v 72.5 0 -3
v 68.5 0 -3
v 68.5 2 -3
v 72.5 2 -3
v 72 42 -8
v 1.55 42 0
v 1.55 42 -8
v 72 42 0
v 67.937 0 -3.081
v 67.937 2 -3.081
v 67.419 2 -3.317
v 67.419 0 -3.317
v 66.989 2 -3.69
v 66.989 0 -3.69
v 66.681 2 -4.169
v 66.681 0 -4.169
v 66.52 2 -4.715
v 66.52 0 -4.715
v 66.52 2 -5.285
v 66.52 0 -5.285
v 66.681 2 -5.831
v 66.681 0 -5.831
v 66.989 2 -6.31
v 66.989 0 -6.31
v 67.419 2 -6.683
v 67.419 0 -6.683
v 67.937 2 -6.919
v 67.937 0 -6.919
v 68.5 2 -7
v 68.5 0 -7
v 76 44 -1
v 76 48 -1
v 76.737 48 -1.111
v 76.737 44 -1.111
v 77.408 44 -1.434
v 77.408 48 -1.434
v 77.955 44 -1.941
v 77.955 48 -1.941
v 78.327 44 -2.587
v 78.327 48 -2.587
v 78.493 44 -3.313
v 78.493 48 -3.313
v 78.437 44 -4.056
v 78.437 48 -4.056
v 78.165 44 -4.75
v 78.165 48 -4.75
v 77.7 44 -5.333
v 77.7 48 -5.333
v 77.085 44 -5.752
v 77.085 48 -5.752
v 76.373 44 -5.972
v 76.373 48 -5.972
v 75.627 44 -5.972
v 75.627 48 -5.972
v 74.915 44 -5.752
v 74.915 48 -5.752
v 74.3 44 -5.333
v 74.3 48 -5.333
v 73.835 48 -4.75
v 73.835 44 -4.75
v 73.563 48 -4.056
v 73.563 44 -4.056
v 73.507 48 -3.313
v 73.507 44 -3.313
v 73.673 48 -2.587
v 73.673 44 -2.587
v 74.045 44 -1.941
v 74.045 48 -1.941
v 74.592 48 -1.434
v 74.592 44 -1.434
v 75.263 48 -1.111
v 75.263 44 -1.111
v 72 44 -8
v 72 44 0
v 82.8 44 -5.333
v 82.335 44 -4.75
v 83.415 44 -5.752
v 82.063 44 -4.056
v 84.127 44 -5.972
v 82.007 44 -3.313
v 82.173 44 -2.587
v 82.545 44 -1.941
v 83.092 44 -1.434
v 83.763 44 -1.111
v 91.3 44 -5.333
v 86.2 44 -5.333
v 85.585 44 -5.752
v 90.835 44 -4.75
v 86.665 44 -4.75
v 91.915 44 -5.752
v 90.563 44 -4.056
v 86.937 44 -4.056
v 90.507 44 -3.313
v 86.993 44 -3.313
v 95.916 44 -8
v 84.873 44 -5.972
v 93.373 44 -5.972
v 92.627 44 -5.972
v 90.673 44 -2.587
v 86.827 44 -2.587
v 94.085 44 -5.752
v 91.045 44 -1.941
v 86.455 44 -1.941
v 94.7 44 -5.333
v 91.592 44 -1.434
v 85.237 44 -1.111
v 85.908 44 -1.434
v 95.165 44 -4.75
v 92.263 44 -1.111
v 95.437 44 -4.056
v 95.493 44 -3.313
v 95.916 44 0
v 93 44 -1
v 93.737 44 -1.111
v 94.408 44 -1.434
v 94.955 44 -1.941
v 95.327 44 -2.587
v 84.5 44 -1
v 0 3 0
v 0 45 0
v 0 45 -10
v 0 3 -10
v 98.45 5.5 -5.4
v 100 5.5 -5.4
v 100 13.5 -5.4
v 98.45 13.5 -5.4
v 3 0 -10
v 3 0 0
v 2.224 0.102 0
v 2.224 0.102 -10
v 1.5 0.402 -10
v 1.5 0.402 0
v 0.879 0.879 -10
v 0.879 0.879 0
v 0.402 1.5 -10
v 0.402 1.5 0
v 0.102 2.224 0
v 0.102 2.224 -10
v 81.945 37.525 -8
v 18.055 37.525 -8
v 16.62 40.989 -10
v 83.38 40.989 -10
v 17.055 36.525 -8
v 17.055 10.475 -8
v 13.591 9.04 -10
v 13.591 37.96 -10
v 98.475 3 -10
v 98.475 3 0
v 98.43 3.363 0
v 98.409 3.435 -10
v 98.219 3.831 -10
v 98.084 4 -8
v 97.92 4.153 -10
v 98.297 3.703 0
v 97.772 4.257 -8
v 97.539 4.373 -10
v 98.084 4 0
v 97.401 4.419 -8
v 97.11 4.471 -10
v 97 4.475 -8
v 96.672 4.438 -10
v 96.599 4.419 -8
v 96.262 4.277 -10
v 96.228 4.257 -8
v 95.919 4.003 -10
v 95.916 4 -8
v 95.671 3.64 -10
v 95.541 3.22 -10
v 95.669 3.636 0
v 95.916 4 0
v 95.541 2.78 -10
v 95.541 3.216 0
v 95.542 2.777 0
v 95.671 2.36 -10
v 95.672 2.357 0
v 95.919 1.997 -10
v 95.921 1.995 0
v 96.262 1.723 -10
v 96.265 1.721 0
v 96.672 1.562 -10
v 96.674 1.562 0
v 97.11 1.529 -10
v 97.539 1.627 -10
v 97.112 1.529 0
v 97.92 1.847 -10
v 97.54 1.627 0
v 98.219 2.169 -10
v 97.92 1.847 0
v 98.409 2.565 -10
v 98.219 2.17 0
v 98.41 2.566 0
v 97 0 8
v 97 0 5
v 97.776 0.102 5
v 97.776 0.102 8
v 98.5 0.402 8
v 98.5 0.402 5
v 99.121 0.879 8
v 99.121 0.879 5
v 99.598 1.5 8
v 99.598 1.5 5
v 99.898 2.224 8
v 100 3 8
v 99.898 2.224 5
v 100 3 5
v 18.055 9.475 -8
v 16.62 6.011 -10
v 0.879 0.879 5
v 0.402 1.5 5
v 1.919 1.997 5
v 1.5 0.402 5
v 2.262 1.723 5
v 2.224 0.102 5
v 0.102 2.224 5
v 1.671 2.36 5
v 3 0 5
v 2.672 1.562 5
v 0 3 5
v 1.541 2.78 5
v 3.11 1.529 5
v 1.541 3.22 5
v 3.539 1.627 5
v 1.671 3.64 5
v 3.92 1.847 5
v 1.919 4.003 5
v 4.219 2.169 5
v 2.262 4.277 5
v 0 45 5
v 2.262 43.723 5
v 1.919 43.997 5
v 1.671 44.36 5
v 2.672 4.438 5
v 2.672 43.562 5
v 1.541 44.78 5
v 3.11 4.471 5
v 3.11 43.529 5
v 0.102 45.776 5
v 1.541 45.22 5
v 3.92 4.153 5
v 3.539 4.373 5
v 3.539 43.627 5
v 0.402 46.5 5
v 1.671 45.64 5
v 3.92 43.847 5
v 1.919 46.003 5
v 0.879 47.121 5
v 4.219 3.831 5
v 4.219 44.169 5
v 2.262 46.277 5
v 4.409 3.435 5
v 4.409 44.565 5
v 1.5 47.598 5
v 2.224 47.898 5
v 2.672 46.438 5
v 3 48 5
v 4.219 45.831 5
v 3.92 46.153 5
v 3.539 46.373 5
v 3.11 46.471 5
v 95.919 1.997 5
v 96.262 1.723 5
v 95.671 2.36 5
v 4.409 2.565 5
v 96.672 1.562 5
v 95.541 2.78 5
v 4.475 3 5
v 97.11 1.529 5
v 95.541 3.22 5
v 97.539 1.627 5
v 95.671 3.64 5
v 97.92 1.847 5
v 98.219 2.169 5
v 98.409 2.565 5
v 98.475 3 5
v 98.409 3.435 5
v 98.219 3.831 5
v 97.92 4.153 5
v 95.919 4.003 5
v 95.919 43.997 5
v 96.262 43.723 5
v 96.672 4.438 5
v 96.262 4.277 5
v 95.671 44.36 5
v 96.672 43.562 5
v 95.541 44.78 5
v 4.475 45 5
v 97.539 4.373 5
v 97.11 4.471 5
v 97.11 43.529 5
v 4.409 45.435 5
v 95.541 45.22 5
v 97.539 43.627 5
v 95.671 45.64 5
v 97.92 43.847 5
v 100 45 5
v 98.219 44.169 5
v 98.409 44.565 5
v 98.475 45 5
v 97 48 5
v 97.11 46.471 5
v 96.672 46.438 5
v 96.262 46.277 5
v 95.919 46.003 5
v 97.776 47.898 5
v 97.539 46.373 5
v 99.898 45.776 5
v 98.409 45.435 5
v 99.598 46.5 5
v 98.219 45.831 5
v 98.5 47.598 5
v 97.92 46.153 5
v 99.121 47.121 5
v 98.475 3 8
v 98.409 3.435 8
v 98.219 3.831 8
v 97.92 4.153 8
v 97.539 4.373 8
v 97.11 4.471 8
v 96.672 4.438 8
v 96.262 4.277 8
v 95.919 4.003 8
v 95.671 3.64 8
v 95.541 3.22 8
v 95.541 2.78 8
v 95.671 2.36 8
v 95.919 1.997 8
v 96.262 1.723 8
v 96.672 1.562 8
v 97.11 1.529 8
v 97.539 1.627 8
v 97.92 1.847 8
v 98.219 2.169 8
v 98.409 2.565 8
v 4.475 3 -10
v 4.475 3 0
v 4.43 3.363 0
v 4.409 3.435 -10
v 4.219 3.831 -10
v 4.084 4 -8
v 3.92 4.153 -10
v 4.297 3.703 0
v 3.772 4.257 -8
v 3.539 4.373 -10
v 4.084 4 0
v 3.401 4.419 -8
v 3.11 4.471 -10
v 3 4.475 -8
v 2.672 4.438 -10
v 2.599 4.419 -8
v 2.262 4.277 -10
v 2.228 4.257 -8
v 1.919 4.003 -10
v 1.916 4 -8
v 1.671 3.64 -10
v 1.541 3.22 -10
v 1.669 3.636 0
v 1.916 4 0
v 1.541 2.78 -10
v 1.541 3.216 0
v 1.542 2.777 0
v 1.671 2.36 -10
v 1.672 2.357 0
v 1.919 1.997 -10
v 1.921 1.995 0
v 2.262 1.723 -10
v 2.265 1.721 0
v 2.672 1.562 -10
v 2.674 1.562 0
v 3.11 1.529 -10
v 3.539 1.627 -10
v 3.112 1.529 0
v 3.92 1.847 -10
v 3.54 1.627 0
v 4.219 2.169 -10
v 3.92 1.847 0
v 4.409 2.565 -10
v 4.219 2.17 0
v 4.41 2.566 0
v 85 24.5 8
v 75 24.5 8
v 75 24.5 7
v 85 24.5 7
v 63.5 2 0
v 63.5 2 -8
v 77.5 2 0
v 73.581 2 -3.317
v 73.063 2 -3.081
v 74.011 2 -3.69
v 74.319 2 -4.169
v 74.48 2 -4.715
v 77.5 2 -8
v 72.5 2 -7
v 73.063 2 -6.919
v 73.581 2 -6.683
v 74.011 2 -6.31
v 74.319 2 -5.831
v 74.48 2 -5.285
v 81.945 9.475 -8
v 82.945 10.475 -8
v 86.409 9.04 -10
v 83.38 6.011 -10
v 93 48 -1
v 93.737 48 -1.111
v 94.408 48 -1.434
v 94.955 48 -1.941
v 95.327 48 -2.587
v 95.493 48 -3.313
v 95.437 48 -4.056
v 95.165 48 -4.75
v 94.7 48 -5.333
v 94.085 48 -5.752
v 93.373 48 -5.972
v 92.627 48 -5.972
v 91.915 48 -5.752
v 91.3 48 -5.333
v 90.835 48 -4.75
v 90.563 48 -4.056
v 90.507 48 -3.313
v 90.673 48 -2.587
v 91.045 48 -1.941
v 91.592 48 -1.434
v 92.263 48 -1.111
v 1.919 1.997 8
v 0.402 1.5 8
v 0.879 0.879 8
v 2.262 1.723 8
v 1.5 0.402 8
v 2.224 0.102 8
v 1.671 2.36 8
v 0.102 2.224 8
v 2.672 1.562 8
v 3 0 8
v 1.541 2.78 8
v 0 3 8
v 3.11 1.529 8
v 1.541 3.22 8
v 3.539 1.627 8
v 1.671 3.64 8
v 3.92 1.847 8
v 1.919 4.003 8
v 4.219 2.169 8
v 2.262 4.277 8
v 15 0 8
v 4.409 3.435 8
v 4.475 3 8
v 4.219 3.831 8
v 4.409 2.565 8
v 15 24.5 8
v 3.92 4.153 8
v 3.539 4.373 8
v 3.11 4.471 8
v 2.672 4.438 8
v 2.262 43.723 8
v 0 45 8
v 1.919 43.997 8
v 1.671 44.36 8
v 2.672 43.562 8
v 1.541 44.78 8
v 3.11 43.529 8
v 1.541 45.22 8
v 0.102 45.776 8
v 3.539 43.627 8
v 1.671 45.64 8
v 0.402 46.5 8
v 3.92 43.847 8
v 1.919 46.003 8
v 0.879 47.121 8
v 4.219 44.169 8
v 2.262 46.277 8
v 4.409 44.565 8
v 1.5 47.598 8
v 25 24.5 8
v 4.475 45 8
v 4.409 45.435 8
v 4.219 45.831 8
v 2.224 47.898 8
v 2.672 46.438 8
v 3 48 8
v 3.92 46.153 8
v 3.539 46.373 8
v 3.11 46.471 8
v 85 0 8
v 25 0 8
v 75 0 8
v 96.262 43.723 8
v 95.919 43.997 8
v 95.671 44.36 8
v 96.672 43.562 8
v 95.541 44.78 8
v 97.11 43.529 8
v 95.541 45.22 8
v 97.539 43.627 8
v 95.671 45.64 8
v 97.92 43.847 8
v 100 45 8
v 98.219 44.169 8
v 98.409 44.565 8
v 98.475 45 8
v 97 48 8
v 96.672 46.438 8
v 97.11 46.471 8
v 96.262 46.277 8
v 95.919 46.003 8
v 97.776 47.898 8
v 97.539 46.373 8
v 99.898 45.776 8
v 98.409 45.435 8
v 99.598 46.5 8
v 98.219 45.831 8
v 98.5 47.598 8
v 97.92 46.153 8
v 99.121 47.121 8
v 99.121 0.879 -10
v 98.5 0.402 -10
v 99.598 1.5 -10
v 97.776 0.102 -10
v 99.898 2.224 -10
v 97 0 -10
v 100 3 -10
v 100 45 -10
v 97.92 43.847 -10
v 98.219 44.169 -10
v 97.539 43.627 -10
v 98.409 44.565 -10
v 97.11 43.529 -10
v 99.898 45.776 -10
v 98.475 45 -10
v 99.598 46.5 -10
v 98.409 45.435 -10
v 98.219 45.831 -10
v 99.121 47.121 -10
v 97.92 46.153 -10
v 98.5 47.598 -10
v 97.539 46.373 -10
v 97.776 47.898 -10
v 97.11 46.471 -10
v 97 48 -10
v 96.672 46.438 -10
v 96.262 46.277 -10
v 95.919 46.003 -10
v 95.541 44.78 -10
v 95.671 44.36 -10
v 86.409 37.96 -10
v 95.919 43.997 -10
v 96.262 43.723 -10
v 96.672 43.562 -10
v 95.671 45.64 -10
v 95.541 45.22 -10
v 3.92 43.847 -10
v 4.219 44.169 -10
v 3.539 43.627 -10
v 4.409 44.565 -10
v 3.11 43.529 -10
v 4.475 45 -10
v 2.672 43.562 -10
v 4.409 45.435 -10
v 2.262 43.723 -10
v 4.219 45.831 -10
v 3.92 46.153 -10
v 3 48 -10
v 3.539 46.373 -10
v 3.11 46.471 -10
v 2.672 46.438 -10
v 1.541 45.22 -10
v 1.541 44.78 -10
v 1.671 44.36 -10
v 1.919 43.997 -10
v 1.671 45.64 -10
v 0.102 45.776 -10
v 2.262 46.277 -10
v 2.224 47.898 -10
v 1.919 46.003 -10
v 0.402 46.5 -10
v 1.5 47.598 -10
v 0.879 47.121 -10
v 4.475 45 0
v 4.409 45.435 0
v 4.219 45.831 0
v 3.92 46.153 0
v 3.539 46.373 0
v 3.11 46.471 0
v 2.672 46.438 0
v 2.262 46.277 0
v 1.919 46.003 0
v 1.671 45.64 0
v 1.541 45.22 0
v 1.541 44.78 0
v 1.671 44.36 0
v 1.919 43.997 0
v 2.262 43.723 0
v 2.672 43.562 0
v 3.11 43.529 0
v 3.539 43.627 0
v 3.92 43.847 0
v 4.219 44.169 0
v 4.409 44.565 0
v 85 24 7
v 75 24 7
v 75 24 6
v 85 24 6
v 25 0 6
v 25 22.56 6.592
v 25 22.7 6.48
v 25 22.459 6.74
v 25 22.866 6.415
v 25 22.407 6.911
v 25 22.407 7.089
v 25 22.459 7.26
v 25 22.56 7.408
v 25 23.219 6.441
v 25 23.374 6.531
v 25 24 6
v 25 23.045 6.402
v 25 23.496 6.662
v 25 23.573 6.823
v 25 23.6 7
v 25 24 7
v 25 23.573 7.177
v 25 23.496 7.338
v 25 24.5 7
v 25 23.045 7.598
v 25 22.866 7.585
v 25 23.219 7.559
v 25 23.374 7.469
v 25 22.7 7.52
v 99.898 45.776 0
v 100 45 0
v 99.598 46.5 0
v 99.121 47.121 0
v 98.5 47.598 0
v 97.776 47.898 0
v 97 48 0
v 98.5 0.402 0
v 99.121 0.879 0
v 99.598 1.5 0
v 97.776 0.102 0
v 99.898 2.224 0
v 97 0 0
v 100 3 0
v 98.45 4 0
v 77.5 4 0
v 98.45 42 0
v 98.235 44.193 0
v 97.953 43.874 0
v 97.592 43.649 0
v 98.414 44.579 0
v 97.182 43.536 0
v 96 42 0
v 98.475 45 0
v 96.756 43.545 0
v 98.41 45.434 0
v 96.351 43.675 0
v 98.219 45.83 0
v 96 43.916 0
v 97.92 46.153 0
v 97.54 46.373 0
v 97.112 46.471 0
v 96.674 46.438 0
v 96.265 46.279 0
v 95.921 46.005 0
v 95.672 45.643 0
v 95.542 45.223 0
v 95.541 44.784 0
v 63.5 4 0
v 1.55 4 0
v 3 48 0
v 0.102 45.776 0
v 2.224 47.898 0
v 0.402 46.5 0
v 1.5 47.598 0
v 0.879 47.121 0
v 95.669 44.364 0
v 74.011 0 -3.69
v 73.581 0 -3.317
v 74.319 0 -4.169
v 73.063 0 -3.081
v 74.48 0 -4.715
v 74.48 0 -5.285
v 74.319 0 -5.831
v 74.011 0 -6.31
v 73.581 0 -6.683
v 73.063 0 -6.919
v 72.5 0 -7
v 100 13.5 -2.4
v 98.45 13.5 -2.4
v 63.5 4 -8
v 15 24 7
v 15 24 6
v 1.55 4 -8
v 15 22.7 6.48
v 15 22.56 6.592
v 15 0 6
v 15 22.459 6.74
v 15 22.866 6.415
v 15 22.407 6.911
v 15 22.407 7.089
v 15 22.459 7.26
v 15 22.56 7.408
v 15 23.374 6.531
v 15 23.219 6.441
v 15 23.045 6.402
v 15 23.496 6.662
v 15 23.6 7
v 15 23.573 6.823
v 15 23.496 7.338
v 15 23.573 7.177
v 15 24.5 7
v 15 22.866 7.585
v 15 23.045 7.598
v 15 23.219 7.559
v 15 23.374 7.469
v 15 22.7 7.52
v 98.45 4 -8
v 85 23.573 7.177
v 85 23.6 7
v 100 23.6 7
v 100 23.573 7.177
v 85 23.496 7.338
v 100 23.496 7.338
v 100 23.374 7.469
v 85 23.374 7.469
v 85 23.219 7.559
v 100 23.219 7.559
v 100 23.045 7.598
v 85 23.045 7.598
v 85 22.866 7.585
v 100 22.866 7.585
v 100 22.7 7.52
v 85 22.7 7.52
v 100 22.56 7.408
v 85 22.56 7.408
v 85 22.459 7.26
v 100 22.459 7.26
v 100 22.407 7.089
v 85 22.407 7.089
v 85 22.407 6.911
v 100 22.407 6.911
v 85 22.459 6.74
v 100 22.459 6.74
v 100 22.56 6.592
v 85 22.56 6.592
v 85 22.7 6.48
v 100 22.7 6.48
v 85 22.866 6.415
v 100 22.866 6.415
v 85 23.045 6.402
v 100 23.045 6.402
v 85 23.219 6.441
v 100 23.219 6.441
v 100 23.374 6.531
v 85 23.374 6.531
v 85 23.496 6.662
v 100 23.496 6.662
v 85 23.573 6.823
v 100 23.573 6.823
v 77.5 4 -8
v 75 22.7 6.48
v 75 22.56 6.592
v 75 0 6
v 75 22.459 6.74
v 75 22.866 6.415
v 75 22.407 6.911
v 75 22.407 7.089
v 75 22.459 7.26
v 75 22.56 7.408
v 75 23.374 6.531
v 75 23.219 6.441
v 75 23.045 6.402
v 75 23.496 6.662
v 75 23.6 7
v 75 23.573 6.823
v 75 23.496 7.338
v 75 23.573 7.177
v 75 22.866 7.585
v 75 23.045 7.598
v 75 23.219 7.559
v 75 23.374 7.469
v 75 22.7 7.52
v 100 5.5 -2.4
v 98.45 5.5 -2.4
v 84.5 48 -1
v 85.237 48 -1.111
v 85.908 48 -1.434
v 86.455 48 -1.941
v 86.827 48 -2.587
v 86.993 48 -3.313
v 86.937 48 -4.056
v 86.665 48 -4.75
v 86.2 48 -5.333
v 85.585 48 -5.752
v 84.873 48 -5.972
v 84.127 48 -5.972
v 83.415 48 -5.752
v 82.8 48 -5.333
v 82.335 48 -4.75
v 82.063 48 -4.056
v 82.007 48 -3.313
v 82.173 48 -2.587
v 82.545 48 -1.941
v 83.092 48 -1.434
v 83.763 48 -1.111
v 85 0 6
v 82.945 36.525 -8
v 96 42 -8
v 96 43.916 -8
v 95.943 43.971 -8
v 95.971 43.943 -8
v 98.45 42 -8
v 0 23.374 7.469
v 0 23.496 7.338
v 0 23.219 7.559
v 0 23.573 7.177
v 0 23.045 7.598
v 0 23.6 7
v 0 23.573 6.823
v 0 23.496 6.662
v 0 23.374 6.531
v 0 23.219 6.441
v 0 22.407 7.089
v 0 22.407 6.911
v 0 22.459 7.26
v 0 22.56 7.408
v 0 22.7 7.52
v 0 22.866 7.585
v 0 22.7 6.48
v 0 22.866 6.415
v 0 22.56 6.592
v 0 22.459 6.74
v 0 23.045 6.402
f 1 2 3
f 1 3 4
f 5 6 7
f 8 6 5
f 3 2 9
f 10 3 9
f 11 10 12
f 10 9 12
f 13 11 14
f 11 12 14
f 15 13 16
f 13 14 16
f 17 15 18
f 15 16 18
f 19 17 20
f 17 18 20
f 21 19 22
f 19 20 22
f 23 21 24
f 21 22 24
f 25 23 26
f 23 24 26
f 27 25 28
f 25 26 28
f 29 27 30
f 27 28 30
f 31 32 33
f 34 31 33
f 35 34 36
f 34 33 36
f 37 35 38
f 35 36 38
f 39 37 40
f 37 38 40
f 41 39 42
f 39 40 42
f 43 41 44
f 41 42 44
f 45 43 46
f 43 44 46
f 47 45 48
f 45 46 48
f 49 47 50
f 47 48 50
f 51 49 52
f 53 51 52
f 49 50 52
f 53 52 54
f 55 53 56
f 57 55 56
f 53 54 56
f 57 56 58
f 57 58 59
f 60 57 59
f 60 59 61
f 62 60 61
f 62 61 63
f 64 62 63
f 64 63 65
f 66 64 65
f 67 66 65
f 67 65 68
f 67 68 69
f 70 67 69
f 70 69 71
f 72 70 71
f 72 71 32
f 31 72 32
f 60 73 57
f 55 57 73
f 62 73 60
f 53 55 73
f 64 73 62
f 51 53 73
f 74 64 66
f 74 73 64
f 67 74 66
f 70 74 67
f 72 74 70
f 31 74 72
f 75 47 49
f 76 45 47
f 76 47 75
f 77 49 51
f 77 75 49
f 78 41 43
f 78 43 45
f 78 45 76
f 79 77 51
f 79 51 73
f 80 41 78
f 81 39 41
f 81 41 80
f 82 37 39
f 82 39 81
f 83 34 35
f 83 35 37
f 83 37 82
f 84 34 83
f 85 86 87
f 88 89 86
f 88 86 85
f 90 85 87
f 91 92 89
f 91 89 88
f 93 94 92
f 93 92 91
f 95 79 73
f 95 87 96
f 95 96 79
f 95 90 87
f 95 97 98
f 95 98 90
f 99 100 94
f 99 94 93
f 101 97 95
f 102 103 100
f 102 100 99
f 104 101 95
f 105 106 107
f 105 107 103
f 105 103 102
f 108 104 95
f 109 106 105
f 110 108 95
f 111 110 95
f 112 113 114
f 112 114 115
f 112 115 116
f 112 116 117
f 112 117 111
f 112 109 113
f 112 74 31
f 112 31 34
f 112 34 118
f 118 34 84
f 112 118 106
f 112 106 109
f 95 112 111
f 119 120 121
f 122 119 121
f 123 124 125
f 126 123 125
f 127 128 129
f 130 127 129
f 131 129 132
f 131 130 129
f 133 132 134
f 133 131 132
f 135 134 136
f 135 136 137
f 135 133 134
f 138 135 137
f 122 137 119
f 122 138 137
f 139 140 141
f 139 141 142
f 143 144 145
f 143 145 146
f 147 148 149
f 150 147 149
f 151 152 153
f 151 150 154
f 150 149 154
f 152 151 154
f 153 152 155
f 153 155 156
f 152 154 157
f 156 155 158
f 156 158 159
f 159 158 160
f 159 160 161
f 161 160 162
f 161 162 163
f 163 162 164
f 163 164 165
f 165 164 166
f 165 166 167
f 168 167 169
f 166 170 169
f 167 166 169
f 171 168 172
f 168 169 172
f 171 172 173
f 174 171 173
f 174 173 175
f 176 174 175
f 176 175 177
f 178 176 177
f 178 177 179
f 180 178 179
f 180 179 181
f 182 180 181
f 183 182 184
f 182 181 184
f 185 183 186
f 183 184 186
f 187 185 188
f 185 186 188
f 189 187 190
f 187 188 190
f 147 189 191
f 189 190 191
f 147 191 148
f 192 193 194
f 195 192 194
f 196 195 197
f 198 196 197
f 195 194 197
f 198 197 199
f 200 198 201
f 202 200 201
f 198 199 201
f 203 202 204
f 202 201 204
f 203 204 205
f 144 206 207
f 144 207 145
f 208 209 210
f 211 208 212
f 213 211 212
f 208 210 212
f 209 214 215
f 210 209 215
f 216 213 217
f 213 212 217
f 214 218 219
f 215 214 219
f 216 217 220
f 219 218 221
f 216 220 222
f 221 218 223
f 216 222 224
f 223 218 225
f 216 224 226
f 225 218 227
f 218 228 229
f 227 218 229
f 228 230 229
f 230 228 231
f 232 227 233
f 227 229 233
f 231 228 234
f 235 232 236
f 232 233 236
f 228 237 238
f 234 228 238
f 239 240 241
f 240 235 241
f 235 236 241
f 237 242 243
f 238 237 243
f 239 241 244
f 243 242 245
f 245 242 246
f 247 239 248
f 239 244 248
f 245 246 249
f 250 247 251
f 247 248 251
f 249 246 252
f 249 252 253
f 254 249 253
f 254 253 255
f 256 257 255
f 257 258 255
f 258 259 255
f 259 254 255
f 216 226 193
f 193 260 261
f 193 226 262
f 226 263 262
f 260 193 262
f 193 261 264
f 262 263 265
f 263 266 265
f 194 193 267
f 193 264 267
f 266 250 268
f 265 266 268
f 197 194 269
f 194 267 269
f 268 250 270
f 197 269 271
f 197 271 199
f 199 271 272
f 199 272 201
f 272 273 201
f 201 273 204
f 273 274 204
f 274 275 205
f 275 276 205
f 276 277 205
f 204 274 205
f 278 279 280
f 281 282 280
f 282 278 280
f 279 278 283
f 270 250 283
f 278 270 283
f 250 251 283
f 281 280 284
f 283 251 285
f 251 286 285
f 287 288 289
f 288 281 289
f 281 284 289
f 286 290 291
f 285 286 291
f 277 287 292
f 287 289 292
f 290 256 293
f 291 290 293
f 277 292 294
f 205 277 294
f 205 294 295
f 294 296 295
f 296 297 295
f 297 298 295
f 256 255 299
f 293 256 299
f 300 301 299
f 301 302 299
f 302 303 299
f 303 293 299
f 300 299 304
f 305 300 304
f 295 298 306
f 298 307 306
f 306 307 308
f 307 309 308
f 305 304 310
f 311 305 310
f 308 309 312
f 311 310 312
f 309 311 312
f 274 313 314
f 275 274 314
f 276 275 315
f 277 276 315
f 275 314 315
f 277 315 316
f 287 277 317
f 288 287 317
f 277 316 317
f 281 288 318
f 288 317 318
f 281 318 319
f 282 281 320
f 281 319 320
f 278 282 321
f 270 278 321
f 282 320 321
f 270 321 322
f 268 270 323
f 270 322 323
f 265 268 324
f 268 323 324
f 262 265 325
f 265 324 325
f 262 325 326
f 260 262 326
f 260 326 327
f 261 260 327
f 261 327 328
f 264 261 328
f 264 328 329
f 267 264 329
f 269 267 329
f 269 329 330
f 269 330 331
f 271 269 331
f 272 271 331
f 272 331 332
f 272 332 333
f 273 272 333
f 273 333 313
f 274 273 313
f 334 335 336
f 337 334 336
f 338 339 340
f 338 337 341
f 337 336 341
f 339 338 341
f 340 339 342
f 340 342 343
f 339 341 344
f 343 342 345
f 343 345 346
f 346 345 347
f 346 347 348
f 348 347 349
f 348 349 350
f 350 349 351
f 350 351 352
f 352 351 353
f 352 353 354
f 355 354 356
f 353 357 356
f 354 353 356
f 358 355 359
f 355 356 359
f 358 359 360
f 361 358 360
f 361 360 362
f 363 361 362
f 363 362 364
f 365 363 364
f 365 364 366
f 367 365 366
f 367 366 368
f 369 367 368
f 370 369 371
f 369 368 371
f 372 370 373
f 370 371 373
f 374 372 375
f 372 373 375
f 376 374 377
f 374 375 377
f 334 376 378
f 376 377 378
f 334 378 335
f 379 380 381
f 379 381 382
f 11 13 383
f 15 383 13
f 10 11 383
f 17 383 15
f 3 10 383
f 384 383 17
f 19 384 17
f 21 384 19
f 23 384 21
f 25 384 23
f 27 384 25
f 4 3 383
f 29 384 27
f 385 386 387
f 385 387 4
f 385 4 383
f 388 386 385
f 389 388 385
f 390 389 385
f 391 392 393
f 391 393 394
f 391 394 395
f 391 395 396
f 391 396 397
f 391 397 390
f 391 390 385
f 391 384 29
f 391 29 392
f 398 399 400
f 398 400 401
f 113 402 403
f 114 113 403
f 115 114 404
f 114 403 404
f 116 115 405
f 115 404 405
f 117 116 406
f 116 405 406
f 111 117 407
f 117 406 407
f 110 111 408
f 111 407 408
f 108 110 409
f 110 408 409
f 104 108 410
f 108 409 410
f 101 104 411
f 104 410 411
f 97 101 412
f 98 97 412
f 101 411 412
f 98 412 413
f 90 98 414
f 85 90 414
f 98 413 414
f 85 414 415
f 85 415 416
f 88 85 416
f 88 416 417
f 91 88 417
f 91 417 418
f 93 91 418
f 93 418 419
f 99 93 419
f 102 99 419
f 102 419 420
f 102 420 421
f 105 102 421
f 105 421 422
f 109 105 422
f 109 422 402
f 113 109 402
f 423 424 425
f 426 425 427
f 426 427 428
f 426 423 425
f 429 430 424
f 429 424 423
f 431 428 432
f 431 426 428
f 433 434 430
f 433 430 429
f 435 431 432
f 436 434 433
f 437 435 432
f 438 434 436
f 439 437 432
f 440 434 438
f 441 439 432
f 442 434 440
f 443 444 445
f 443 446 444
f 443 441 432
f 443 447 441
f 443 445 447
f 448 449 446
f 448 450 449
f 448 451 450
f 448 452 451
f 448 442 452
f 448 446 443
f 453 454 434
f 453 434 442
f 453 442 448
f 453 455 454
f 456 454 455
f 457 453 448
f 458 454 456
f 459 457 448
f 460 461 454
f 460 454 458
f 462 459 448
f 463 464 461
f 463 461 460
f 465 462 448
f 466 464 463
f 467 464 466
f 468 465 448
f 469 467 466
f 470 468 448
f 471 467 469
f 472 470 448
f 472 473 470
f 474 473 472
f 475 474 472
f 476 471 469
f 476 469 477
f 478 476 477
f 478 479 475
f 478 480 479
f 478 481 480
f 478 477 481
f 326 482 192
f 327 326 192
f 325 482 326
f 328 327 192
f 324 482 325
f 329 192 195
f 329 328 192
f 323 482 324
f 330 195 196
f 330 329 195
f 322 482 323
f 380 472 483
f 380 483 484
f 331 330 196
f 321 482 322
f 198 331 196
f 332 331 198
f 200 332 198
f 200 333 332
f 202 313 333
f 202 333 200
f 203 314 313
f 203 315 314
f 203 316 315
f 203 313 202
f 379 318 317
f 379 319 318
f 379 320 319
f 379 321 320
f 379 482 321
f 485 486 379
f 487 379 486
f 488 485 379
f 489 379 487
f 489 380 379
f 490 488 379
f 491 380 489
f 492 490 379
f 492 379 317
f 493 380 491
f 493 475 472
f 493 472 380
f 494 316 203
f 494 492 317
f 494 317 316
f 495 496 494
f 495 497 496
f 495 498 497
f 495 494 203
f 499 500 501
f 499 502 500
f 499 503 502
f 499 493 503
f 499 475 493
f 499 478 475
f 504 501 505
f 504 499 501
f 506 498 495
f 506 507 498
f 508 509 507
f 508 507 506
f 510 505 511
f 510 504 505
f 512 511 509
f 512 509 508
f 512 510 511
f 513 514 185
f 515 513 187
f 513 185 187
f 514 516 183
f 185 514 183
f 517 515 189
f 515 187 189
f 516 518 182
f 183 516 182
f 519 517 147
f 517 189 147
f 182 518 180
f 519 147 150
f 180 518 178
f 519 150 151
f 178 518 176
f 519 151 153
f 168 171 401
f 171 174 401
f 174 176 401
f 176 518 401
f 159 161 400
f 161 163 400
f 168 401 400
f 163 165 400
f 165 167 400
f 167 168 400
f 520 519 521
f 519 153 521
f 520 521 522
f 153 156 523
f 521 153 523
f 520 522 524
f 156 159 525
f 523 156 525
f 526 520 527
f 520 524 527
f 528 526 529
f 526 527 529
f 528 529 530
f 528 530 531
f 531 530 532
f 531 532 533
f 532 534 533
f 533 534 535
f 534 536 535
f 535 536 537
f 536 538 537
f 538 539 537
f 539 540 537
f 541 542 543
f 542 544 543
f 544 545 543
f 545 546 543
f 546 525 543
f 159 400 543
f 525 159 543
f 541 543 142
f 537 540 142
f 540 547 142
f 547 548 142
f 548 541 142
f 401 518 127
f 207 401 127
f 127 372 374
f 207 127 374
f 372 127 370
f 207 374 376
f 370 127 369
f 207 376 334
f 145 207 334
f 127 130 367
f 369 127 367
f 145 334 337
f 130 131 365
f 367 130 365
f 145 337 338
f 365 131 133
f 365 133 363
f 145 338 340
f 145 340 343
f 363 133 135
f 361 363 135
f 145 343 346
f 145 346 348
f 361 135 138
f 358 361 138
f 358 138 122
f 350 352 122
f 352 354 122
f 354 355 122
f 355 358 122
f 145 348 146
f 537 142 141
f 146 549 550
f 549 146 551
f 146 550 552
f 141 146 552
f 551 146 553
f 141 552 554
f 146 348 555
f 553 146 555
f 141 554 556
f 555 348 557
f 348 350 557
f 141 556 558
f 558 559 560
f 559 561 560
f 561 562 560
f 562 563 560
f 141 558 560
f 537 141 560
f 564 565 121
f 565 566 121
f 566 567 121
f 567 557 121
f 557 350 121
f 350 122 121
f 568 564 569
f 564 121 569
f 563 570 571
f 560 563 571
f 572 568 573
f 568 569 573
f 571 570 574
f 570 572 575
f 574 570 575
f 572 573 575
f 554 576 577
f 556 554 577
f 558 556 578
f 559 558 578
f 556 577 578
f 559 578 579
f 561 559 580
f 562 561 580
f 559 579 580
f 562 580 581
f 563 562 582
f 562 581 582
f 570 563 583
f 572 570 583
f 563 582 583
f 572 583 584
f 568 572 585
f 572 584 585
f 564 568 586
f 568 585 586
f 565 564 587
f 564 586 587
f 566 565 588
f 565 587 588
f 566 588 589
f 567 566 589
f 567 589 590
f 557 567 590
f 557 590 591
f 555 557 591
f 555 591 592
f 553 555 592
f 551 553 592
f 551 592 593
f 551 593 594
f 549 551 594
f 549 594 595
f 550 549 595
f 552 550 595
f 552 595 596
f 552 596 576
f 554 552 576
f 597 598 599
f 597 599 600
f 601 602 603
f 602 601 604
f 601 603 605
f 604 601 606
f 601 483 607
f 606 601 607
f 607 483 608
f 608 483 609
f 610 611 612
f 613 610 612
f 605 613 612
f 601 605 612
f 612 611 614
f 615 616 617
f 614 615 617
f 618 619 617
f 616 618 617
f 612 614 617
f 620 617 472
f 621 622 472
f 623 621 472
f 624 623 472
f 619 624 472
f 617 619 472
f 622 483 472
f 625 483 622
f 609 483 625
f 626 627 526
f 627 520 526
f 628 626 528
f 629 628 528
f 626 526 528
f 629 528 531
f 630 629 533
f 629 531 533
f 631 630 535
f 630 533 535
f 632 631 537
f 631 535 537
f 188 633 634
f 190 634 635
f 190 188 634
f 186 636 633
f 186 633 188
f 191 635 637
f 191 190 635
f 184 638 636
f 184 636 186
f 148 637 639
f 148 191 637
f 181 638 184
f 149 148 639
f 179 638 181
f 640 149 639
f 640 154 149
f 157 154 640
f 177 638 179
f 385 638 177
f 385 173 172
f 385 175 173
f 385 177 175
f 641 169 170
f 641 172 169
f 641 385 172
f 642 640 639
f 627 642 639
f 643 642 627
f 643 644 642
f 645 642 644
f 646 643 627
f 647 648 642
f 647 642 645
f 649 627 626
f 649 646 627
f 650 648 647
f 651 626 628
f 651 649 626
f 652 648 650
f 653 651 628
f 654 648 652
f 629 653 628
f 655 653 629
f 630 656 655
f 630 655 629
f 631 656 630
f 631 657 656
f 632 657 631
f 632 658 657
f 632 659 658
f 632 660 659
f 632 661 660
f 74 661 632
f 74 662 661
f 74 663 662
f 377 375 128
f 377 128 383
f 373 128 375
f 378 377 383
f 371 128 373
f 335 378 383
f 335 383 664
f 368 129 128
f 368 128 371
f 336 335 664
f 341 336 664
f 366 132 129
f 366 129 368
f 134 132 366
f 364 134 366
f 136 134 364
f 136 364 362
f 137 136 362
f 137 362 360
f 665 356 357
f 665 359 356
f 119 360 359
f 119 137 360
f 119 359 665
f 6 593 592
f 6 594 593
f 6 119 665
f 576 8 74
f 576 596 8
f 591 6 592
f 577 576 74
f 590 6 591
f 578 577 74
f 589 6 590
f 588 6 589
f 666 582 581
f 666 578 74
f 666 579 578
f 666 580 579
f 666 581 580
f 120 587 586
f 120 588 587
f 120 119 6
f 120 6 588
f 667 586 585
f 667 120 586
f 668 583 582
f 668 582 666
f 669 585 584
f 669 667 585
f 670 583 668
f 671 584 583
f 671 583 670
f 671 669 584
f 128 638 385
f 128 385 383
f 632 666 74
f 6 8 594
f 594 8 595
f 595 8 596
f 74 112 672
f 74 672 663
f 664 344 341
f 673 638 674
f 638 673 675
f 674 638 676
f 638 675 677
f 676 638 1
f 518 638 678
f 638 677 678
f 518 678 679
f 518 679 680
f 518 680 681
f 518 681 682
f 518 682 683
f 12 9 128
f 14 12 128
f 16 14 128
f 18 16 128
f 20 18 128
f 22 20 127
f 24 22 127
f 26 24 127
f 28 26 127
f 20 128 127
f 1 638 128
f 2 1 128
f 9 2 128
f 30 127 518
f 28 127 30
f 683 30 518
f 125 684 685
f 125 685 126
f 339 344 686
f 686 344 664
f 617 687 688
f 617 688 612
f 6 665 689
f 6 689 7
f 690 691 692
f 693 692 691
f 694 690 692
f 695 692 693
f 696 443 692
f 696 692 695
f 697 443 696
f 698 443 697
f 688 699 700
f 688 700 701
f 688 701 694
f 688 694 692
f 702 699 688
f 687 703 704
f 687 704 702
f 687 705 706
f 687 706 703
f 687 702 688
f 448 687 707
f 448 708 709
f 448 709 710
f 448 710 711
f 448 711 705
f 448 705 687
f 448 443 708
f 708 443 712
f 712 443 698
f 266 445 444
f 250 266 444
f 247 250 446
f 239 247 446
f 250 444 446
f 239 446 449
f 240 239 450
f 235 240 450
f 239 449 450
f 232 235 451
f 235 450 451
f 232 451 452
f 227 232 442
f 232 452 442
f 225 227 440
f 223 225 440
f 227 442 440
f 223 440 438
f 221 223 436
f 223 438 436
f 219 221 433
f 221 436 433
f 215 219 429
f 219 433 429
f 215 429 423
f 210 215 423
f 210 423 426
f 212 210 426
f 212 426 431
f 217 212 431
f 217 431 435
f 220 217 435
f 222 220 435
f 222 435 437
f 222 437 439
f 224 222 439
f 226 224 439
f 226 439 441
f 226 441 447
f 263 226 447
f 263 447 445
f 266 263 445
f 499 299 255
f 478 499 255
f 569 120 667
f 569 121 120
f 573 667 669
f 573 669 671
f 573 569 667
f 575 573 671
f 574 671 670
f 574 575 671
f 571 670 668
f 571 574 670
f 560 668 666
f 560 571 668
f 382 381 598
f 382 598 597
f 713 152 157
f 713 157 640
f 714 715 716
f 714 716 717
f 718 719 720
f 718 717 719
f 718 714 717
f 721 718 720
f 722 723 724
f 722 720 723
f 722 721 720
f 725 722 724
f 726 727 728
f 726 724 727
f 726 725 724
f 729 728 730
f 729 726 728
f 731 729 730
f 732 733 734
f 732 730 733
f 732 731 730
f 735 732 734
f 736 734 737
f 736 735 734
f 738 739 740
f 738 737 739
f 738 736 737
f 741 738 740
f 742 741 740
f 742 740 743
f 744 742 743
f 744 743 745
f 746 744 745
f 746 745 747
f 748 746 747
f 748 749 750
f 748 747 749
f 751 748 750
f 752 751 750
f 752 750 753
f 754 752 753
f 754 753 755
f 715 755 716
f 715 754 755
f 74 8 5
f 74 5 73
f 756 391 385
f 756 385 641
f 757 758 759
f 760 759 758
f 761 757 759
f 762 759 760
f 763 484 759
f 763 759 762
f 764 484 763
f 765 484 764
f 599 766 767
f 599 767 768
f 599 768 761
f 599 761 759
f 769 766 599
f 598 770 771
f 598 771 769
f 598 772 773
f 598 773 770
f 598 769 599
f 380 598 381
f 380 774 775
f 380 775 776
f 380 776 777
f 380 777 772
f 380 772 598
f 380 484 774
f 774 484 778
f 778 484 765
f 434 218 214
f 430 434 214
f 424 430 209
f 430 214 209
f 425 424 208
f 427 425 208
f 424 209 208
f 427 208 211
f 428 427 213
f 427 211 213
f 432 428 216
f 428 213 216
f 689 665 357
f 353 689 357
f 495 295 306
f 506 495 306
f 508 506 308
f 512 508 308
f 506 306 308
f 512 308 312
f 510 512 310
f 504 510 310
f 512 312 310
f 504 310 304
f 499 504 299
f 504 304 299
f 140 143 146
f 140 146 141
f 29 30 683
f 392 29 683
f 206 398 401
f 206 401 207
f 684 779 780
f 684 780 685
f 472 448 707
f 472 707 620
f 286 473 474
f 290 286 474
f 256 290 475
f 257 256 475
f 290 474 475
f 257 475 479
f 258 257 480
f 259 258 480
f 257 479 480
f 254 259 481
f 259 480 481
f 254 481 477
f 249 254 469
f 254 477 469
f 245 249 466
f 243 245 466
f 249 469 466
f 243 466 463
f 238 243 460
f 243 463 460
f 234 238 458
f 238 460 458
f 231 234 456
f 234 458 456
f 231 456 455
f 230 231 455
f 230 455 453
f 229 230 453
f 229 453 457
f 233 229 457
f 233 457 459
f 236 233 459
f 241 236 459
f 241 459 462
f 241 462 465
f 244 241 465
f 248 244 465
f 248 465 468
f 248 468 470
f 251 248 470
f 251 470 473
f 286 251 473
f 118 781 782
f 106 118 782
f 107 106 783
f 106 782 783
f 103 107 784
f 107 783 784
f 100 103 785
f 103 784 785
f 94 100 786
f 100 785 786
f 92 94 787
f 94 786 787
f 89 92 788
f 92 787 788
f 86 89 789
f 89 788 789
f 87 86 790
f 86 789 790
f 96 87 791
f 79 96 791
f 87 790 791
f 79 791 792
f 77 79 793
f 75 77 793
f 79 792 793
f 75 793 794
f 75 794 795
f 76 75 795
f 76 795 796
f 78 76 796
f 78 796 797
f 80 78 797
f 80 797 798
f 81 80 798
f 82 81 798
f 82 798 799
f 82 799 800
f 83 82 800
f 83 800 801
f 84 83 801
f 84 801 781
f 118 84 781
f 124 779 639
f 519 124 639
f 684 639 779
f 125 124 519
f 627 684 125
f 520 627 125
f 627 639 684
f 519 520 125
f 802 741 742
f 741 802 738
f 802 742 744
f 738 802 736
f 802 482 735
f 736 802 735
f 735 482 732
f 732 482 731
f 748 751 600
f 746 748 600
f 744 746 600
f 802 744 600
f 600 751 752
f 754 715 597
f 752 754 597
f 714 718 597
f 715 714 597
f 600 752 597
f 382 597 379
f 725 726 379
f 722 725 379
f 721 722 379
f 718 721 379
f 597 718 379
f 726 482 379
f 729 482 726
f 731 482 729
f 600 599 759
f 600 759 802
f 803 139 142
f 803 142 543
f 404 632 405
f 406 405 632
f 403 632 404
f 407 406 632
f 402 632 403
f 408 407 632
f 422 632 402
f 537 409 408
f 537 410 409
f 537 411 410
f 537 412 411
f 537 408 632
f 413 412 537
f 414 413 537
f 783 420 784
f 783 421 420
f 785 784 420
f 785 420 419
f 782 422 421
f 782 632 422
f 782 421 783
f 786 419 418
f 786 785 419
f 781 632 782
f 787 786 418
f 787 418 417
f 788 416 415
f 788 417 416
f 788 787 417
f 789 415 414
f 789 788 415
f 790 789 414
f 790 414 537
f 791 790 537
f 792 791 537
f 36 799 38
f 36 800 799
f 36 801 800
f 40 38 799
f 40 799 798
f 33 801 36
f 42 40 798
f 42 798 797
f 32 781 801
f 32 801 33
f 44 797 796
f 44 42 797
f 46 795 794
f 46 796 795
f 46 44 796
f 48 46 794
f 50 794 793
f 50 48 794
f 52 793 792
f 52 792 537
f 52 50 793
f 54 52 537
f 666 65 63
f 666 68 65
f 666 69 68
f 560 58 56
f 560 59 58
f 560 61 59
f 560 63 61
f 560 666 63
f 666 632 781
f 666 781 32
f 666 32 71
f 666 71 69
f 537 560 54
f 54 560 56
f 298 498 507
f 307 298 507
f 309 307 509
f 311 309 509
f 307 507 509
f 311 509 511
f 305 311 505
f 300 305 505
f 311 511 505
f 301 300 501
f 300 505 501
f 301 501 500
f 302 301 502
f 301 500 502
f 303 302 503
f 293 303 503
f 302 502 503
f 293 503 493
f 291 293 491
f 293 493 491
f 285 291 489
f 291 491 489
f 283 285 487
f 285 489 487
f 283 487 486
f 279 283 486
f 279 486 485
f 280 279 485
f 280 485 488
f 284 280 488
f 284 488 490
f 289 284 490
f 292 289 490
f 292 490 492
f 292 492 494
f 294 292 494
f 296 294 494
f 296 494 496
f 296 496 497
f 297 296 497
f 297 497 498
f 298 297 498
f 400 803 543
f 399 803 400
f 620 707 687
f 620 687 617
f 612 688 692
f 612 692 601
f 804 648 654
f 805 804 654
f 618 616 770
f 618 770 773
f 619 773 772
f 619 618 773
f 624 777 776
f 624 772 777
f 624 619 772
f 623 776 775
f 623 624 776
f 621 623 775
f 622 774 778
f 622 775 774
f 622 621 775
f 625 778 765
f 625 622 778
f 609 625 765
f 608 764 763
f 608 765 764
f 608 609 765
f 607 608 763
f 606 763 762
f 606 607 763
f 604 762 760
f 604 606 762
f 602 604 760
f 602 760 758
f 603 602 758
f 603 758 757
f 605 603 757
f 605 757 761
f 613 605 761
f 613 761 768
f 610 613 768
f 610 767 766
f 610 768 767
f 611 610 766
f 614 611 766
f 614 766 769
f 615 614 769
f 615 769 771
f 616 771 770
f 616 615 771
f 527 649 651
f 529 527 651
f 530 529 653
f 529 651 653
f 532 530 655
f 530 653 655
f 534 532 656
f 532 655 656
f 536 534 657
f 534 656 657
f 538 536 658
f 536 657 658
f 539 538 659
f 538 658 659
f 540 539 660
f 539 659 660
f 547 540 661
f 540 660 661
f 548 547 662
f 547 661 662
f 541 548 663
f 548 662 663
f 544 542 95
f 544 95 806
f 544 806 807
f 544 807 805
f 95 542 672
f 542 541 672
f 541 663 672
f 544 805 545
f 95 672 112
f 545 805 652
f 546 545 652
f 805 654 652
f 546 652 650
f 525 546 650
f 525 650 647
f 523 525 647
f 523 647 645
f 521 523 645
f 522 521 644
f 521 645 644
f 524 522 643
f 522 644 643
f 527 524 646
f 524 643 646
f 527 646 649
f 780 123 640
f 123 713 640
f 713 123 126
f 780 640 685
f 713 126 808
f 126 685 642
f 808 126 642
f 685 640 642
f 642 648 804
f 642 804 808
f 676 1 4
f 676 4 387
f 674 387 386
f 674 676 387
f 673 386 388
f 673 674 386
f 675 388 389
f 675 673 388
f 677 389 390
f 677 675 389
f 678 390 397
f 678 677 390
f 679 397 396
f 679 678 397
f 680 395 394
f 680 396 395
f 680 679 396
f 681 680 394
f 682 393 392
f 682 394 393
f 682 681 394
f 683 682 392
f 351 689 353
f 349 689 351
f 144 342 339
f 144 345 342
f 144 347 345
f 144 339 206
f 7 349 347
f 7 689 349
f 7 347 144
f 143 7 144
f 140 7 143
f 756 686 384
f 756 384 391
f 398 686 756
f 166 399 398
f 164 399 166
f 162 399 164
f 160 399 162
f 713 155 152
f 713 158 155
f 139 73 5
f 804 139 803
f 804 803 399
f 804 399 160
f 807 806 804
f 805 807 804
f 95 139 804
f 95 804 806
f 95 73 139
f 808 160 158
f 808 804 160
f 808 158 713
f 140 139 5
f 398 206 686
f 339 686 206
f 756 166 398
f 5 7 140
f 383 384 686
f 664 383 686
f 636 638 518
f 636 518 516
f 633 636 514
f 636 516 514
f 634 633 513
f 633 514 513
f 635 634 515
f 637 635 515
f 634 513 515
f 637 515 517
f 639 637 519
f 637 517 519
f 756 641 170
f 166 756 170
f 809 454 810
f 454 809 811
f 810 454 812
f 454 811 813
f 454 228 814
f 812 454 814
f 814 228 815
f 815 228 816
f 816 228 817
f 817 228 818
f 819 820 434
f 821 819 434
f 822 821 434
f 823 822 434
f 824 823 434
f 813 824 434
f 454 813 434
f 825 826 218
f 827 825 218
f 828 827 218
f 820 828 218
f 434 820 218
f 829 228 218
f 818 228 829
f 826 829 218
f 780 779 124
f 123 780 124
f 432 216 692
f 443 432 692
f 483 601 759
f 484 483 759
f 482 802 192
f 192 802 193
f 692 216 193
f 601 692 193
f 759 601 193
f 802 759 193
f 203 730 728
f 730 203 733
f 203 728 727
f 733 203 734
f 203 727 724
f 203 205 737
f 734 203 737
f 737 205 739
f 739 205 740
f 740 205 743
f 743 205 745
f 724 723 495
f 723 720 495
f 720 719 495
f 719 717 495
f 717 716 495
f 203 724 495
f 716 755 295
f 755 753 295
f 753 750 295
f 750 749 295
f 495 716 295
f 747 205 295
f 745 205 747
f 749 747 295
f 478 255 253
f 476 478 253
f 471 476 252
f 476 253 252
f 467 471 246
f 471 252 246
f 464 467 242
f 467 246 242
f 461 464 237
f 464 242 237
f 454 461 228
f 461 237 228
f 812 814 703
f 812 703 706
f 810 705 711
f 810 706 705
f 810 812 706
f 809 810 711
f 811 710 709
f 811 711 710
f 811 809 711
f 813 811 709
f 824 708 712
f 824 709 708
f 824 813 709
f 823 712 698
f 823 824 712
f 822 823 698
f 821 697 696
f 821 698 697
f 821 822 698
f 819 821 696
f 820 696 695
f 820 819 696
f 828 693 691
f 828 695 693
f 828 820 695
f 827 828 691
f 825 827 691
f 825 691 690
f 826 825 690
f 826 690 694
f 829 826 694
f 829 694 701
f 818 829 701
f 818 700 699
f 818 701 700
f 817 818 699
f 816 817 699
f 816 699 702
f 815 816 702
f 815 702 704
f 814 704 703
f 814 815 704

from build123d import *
from OCP.BRepFilletAPI import BRepFilletAPI_MakeChamfer

# Parameters (mm, degrees)
SKETCH_1_W                = 10
SKETCH_1_H                = 48
EXTRUDE_2_DEPTH           = 100
CUT_EXTRUDE_3_DEPTH       = 112.373246339
SKETCH_4_3_W              = 96.9
SKETCH_4_3_H              = 38
CUT_EXTRUDE_4_DEPTH       = 8
CHAMFER_4_SIZE            = 3.464101615
CHAMFER_4_SIZE_2          = 2
FILLET_1_R                = 3
SKETCH_13_W               = 24
SKETCH_13_H               = 2
CUT_EXTRUDE_17_DEPTH      = 8
CUT_EXTRUDE_18_REACH      = 113.373
SKETCH_12_R               = 2.5
CUT_EXTRUDE_19_REACH      = 113.373
SKETCH_14_W               = 3
SKETCH_14_H               = 8
CUT_EXTRUDE_20_REACH      = 113.373
SKETCH_15_W               = 4
SKETCH_15_H               = 4
CUT_EXTRUDE_START         = -8
SKETCH_16_W               = 14
SKETCH_16_H               = 2
CUT_EXTRUDE_21_DEPTH      = 8
EXTRUDE_START             = 5
EXTRUDE_3_DEPTH           = 3
SKETCH_8_W                = 10
SKETCH_8_H                = 24
CUT_EXTRUDE_9_DEPTH       = 2
CUT_EXTRUDE_10_DEPTH      = 90.604687377
CUT_EXTRUDE_10_DEPTH_BACK = 90.604687377
SKETCH_9_R                = 0.6
SKETCH_10_R               = 1.475
CUT_EXTRUDE_12_DEPTH      = 113.374374303
SKETCH_8_4_W              = 10
SKETCH_8_4_H              = 0.5
CUT_EXTRUDE_16_DEPTH      = 1


with BuildPart() as part:
    # 草图1 → 凸台-拉伸2 (new body)
    with BuildSketch(Plane(origin=(0, 0, 0), x_dir=(0, 0, -1), z_dir=(1, 0, 0))):
        with Locations((5, 24)):
            Rectangle(SKETCH_1_W, SKETCH_1_H)
    extrude(amount=EXTRUDE_2_DEPTH)

    # 草图4 → 切除-拉伸3 (cut, through all)
    with BuildSketch(Plane.XY):
        Polygon((81.945, 37.525), (82.945, 36.525), (82.945, 10.475), (81.945, 9.475), (18.055, 9.475), (17.055, 10.475), (17.055, 36.525), (18.055, 37.525), align=None)
    extrude(amount=-CUT_EXTRUDE_3_DEPTH, mode=Mode.SUBTRACT)

    # 草图4<3> → 切除-拉伸4 (cut)
    with BuildSketch(Plane.XY):
        with Locations((50, 23)):
            Rectangle(SKETCH_4_3_W, SKETCH_4_3_H)
    extrude(amount=-CUT_EXTRUDE_4_DEPTH, mode=Mode.SUBTRACT)

    # 倒角4
    chamfer_4_edges_1 = [part.edges().sort_by_distance(p)[0] for p in [
        (17.055, 23.5, -10),
    ]]
    chamfer_4_side_1 = [part.faces().sort_by_distance(p)[0] for p in [
        (17.015, 23.5, -10),
    ]]
    chamfer_4_edges_2 = [part.edges().sort_by_distance(p)[0] for p in [
        (17.555, 37.025, -10),
    ]]
    chamfer_4_side_2 = [part.faces().sort_by_distance(p)[0] for p in [
        (17.526715729, 37.053284271, -10),
    ]]
    chamfer_4_edges_3 = [part.edges().sort_by_distance(p)[0] for p in [
        (50, 37.525, -10),
    ]]
    chamfer_4_side_3 = [part.faces().sort_by_distance(p)[0] for p in [
        (50, 37.565, -10),
    ]]
    chamfer_4_edges_4 = [part.edges().sort_by_distance(p)[0] for p in [
        (82.445, 37.025, -10),
    ]]
    chamfer_4_side_4 = [part.faces().sort_by_distance(p)[0] for p in [
        (82.473284271, 37.053284271, -10),
    ]]
    chamfer_4_edges_5 = [part.edges().sort_by_distance(p)[0] for p in [
        (82.945, 23.5, -10),
    ]]
    chamfer_4_side_5 = [part.faces().sort_by_distance(p)[0] for p in [
        (82.985, 23.5, -10),
    ]]
    chamfer_4_edges_6 = [part.edges().sort_by_distance(p)[0] for p in [
        (82.445, 9.975, -10),
    ]]
    chamfer_4_side_6 = [part.faces().sort_by_distance(p)[0] for p in [
        (82.473284271, 9.946715729, -10),
    ]]
    chamfer_4_edges_7 = [part.edges().sort_by_distance(p)[0] for p in [
        (50, 9.475, -10),
    ]]
    chamfer_4_side_7 = [part.faces().sort_by_distance(p)[0] for p in [
        (50, 9.435, -10),
    ]]
    chamfer_4_edges_8 = [part.edges().sort_by_distance(p)[0] for p in [
        (17.555, 9.975, -10),
    ]]
    chamfer_4_side_8 = [part.faces().sort_by_distance(p)[0] for p in [
        (17.526715729, 9.946715729, -10),
    ]]
    chamfer_4 = BRepFilletAPI_MakeChamfer(part.part.solid().wrapped)
    for e in chamfer_4_edges_1:
        chamfer_4.Add(CHAMFER_4_SIZE - 0.0001, CHAMFER_4_SIZE_2 - 0.0001, e.wrapped, chamfer_4_side_1[0].wrapped)
    for e in chamfer_4_edges_2:
        chamfer_4.Add(CHAMFER_4_SIZE - 0.0001, CHAMFER_4_SIZE_2 - 0.0001, e.wrapped, chamfer_4_side_2[0].wrapped)
    for e in chamfer_4_edges_3:
        chamfer_4.Add(CHAMFER_4_SIZE - 0.0001, CHAMFER_4_SIZE_2 - 0.0001, e.wrapped, chamfer_4_side_3[0].wrapped)
    for e in chamfer_4_edges_4:
        chamfer_4.Add(CHAMFER_4_SIZE - 0.0001, CHAMFER_4_SIZE_2 - 0.0001, e.wrapped, chamfer_4_side_4[0].wrapped)
    for e in chamfer_4_edges_5:
        chamfer_4.Add(CHAMFER_4_SIZE - 0.0001, CHAMFER_4_SIZE_2 - 0.0001, e.wrapped, chamfer_4_side_5[0].wrapped)
    for e in chamfer_4_edges_6:
        chamfer_4.Add(CHAMFER_4_SIZE - 0.0001, CHAMFER_4_SIZE_2 - 0.0001, e.wrapped, chamfer_4_side_6[0].wrapped)
    for e in chamfer_4_edges_7:
        chamfer_4.Add(CHAMFER_4_SIZE - 0.0001, CHAMFER_4_SIZE_2 - 0.0001, e.wrapped, chamfer_4_side_7[0].wrapped)
    for e in chamfer_4_edges_8:
        chamfer_4.Add(CHAMFER_4_SIZE - 0.0001, CHAMFER_4_SIZE_2 - 0.0001, e.wrapped, chamfer_4_side_8[0].wrapped)
    add(Compound.cast(chamfer_4.Shape()), mode=Mode.REPLACE)  # a hair under: the kernel refuses the full size

    # 圆角1
    fillet_1_edges = [part.edges().sort_by_distance(p)[0] for p in [
        (100, 0, -5),
        (100, 48, -5),
        (0, 0, -5),
        (0, 48, -5),
    ]]
    fillet(fillet_1_edges, radius=FILLET_1_R)

    # 草图13 → 切除-拉伸17 (cut)
    with BuildSketch(Plane.XY):
        with Locations((84, 43)):
            Rectangle(SKETCH_13_W, SKETCH_13_H)
    extrude(amount=-CUT_EXTRUDE_17_DEPTH, mode=Mode.SUBTRACT)

    # 草图12 → 切除-拉伸18 (cut, up to next)
    with BuildSketch(Plane(origin=(0, 48, 0), x_dir=(1, 0, 0), z_dir=(0, 1, 0)), mode=Mode.PRIVATE) as cut_extrude_18_sk1:
        with Locations(Location((76, 3.5, 0), (0, 0, 270))):
            Circle(SKETCH_12_R)
    cut_extrude_18_tool1 = extrude(cut_extrude_18_sk1.sketch, amount=-CUT_EXTRUDE_18_REACH, mode=Mode.PRIVATE) & part.part
    # 草图12 → 切除-拉伸18 (cut, up to next)
    with BuildSketch(Plane(origin=(0, 48, 0), x_dir=(1, 0, 0), z_dir=(0, 1, 0)), mode=Mode.PRIVATE) as cut_extrude_18_sk2:
        with Locations(Location((93, 3.5, 0), (0, 0, 270))):
            Circle(SKETCH_12_R)
    cut_extrude_18_tool2 = extrude(cut_extrude_18_sk2.sketch, amount=-CUT_EXTRUDE_18_REACH, mode=Mode.PRIVATE) & part.part
    # 草图12 → 切除-拉伸18 (cut, up to next)
    with BuildSketch(Plane(origin=(0, 48, 0), x_dir=(1, 0, 0), z_dir=(0, 1, 0)), mode=Mode.PRIVATE) as cut_extrude_18_sk3:
        with Locations(Location((84.5, 3.5, 0), (0, 0, 270))):
            Circle(SKETCH_12_R)
    cut_extrude_18_tool3 = extrude(cut_extrude_18_sk3.sketch, amount=-CUT_EXTRUDE_18_REACH, mode=Mode.PRIVATE) & part.part
    add(cut_extrude_18_tool1.solids().sort_by_distance((76, 48, -3.5))[0], mode=Mode.SUBTRACT)
    add(cut_extrude_18_tool2.solids().sort_by_distance((93, 48, -3.5))[0], mode=Mode.SUBTRACT)
    add(cut_extrude_18_tool3.solids().sort_by_distance((84.5, 48, -3.5))[0], mode=Mode.SUBTRACT)

    # 草图14 → 切除-拉伸19 (cut, up to next)
    with BuildSketch(Plane(origin=(100, 0, 0), x_dir=(0, 0, -1), z_dir=(1, 0, 0)), mode=Mode.PRIVATE) as cut_extrude_19_sk1:
        with Locations((3.9, 9.5)):
            Rectangle(SKETCH_14_W, SKETCH_14_H)
    cut_extrude_19_tool1 = extrude(cut_extrude_19_sk1.sketch, amount=-CUT_EXTRUDE_19_REACH, mode=Mode.PRIVATE) & part.part
    add(cut_extrude_19_tool1.solids().sort_by_distance((100, 9.5, -3.9))[0], mode=Mode.SUBTRACT)

    # 草图15 → 切除-拉伸20 (cut, up to next)
    with BuildSketch(Plane.XZ, mode=Mode.PRIVATE) as cut_extrude_20_sk1:
        with Locations((70.5, -5)):
            Rectangle(SKETCH_15_W, SKETCH_15_H)
    cut_extrude_20_tool1 = extrude(cut_extrude_20_sk1.sketch, amount=-CUT_EXTRUDE_20_REACH, mode=Mode.PRIVATE) & part.part
    # 草图15 → 切除-拉伸20 (cut, up to next)
    with BuildSketch(Plane.XZ, mode=Mode.PRIVATE) as cut_extrude_20_sk2:
        with BuildLine():
            ThreePointArc((72.5, -3), (74.5, -5), (72.5, -7))
            Line((72.5, -7), (72.5, -3))
        make_face()
    cut_extrude_20_tool2 = extrude(cut_extrude_20_sk2.sketch, amount=-CUT_EXTRUDE_20_REACH, mode=Mode.PRIVATE) & part.part
    # 草图15 → 切除-拉伸20 (cut, up to next)
    with BuildSketch(Plane.XZ, mode=Mode.PRIVATE) as cut_extrude_20_sk3:
        with BuildLine():
            Line((68.5, -7), (68.5, -3))
            ThreePointArc((68.5, -3), (66.5, -5), (68.5, -7))
        make_face()
    cut_extrude_20_tool3 = extrude(cut_extrude_20_sk3.sketch, amount=-CUT_EXTRUDE_20_REACH, mode=Mode.PRIVATE) & part.part
    add(cut_extrude_20_tool1.solids().sort_by_distance((70.5, 0, -5))[0], mode=Mode.SUBTRACT)
    add(cut_extrude_20_tool2.solids().sort_by_distance((73.348826, 0, -5))[0], mode=Mode.SUBTRACT)
    add(cut_extrude_20_tool3.solids().sort_by_distance((67.651174, 0, -5))[0], mode=Mode.SUBTRACT)

    # 草图16 → 切除-拉伸21 (cut)
    with BuildSketch(Plane.XY.offset(CUT_EXTRUDE_START)):
        with Locations((70.5, 3)):
            Rectangle(SKETCH_16_W, SKETCH_16_H)
    extrude(amount=CUT_EXTRUDE_21_DEPTH, mode=Mode.SUBTRACT)


with BuildPart() as body_2:
    # 草图7 → 凸台-拉伸3 (new body)
    with BuildSketch(Plane.XY.offset(EXTRUDE_START)):
        with BuildLine():
            Line((3, 0), (97, 0))
            ThreePointArc((97, 0), (99.121320344, 0.878679656), (100, 3))
            Line((100, 3), (100, 45))
            ThreePointArc((100, 45), (99.121320344, 47.121320344), (97, 48))
            Line((97, 48), (3, 48))
            ThreePointArc((3, 48), (0.878679656, 47.121320344), (0, 45))
            Line((0, 45), (0, 3))
            ThreePointArc((0, 3), (0.878679656, 0.878679656), (3, 0))
        make_face()
    extrude(amount=EXTRUDE_3_DEPTH)

    # 草图8 → 切除-拉伸9 (cut)
    with BuildSketch(Plane.XY.offset(8)):
        with Locations((20, 12)):
            Rectangle(SKETCH_8_W, SKETCH_8_H)
        with Locations((80, 12)):
            Rectangle(SKETCH_8_W, SKETCH_8_H)
    extrude(amount=-CUT_EXTRUDE_9_DEPTH, mode=Mode.SUBTRACT)

    # 草图9 → 切除-拉伸10 (cut, two sides: drawn at the far end of the back side and taken through both)
    with BuildSketch(Plane(origin=(75, 0, 0), x_dir=(0, 0, -1), z_dir=(1, 0, 0)).offset(-CUT_EXTRUDE_10_DEPTH_BACK)):
        with Locations(Location((-7, 23, 0), (0, 0, 90))):
            Circle(SKETCH_9_R)
    extrude(amount=CUT_EXTRUDE_10_DEPTH + CUT_EXTRUDE_10_DEPTH_BACK, mode=Mode.SUBTRACT)


with BuildPart() as cut_extrude_12_tool:
    # 草图10 → 切除-拉伸12 (new, through all)
    with BuildSketch(Plane.XY.offset(8)):
        with Locations((3, 45)):
            Circle(SKETCH_10_R)
        with Locations((97, 45)):
            Circle(SKETCH_10_R)
        with Locations((97, 3)):
            Circle(SKETCH_10_R)
        with Locations((3, 3)):
            Circle(SKETCH_10_R)
    extrude(amount=-CUT_EXTRUDE_12_DEPTH)


with BuildPart() as part_1:
    add(part.part)

    # 切除-拉伸12: cut by cut_extrude_12_tool
    add(cut_extrude_12_tool.part, mode=Mode.SUBTRACT)


with BuildPart() as body_2_1:
    add(body_2.part)

    # 切除-拉伸12: cut by cut_extrude_12_tool
    add(cut_extrude_12_tool.part, mode=Mode.SUBTRACT)

    # 草图8<4> → 切除-拉伸16 (cut)
    with BuildSketch(Plane.XY.offset(8)):
        with Locations((20, 24.25)):
            Rectangle(SKETCH_8_4_W, SKETCH_8_4_H)
        with Locations((80, 24.25)):
            Rectangle(SKETCH_8_4_W, SKETCH_8_4_H)
    extrude(amount=-CUT_EXTRUDE_16_DEPTH, mode=Mode.SUBTRACT)


solid = Compound([part_1.part, body_2_1.part])
